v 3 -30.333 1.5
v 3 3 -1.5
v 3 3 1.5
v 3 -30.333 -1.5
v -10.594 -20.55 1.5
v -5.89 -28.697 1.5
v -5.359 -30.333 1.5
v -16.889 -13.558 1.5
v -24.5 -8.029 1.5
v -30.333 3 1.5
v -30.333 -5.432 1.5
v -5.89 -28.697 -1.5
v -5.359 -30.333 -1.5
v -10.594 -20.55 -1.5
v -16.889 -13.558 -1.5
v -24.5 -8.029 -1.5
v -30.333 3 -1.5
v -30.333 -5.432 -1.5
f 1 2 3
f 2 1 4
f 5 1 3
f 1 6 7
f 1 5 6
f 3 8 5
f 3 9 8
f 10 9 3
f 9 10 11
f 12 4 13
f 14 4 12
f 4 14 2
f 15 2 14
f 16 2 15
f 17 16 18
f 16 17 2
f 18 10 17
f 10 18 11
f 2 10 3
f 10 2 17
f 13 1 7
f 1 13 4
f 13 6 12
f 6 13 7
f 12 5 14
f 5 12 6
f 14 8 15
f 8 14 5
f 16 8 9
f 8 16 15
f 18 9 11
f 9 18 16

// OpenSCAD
dimension = 100;
material_thickness = 3;
border = 5;

module corner_face() {
	translate([-dimension/2 + material_thickness, -dimension/2 + material_thickness, 0]) difference() {
		translate([dimension/2 - dimension/6, dimension/2 - dimension/6, 0]) cube([dimension/3, dimension/3, material_thickness], center=true);
		#cylinder(r=dimension/2-border, h=material_thickness*2, center=true);
	}

}

!corner_face();

cube([dimension, dimension, dimension], center=true);
